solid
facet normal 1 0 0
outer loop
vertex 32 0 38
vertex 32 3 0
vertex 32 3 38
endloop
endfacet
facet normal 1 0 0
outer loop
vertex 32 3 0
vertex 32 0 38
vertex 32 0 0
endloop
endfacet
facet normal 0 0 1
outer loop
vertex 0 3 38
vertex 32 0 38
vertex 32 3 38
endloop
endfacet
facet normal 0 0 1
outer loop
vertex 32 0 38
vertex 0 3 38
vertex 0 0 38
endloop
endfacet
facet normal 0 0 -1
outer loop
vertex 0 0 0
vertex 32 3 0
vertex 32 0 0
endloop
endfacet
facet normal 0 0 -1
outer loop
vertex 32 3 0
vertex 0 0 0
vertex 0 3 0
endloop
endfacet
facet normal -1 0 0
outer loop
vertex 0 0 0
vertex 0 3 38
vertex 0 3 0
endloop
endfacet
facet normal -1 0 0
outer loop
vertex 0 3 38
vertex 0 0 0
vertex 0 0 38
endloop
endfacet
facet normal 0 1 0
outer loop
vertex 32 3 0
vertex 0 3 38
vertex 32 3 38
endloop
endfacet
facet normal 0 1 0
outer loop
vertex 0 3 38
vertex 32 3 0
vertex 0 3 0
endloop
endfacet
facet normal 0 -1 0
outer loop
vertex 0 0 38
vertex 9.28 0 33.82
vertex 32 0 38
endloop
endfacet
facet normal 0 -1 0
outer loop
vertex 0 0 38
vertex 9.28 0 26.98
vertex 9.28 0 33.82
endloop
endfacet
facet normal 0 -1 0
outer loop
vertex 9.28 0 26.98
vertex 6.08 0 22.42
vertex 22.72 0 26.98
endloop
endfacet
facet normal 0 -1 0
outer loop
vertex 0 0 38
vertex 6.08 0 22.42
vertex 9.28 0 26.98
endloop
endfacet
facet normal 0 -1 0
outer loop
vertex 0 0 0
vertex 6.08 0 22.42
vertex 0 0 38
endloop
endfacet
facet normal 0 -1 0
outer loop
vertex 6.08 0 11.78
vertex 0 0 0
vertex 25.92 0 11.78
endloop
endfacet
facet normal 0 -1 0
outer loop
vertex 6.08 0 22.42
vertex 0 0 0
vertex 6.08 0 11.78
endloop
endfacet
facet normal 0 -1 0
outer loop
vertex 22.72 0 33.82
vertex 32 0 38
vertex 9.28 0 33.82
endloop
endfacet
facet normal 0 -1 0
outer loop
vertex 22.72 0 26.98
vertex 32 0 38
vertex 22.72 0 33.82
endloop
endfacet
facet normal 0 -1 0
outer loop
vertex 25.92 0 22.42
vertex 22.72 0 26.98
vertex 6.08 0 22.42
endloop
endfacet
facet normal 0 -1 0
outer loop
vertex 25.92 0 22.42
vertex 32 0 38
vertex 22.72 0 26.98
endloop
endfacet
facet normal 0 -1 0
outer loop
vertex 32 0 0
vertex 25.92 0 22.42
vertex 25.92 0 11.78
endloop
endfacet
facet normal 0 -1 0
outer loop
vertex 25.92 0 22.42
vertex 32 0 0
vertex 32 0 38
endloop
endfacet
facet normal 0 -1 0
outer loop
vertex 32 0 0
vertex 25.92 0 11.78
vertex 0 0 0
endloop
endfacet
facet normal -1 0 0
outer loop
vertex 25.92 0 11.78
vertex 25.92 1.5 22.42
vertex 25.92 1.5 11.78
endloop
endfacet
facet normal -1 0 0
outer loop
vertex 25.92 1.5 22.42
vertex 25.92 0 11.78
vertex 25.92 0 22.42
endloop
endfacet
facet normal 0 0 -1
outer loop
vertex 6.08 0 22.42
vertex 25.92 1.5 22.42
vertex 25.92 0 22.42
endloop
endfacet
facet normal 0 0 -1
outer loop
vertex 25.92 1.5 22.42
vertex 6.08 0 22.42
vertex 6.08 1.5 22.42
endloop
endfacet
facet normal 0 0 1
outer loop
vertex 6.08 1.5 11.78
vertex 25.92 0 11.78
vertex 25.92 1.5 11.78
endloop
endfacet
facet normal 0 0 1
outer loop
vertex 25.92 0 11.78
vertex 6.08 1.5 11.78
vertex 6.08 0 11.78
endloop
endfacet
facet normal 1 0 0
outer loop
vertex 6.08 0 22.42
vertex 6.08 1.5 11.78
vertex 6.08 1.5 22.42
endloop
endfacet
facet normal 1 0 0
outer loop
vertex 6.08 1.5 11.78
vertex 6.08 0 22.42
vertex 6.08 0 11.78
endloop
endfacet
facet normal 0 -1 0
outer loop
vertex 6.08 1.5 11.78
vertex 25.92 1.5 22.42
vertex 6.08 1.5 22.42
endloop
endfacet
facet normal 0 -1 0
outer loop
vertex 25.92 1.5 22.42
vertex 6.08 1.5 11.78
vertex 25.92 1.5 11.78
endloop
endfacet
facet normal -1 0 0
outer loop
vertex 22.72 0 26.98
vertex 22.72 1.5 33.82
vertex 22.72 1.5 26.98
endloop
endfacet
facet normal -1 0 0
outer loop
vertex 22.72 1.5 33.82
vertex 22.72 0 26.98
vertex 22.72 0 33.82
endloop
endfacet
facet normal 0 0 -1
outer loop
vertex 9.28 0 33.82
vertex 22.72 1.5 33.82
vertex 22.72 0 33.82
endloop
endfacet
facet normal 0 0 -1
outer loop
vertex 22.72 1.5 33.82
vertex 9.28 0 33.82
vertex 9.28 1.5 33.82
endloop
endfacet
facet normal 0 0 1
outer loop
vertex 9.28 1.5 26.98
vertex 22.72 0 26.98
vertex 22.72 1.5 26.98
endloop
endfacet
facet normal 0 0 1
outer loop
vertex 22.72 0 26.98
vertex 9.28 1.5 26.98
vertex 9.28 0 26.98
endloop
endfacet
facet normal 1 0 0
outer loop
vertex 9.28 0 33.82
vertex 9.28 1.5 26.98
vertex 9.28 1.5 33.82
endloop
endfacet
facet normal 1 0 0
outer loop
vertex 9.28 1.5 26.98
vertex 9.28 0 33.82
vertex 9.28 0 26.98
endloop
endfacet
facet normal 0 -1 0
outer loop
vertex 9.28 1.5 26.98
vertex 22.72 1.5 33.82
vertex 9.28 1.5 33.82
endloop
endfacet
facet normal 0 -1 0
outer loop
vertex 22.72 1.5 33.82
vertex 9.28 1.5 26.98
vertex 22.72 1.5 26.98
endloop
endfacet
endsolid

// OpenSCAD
// DIN-rail retaining clip.
$fn = 60;
eps = 0.02;
clip_w = 32;
clip_h = 38;
clip_t = 3;
difference() { cube([clip_w,clip_t,clip_h]); translate([clip_w/2, -eps, clip_h*0.45]) cube([clip_w*0.62,clip_t+2*eps,clip_h*0.28],center=true); translate([clip_w/2, -eps, clip_h*0.8]) cube([clip_w*0.42,clip_t+2*eps,clip_h*0.18],center=true); }
